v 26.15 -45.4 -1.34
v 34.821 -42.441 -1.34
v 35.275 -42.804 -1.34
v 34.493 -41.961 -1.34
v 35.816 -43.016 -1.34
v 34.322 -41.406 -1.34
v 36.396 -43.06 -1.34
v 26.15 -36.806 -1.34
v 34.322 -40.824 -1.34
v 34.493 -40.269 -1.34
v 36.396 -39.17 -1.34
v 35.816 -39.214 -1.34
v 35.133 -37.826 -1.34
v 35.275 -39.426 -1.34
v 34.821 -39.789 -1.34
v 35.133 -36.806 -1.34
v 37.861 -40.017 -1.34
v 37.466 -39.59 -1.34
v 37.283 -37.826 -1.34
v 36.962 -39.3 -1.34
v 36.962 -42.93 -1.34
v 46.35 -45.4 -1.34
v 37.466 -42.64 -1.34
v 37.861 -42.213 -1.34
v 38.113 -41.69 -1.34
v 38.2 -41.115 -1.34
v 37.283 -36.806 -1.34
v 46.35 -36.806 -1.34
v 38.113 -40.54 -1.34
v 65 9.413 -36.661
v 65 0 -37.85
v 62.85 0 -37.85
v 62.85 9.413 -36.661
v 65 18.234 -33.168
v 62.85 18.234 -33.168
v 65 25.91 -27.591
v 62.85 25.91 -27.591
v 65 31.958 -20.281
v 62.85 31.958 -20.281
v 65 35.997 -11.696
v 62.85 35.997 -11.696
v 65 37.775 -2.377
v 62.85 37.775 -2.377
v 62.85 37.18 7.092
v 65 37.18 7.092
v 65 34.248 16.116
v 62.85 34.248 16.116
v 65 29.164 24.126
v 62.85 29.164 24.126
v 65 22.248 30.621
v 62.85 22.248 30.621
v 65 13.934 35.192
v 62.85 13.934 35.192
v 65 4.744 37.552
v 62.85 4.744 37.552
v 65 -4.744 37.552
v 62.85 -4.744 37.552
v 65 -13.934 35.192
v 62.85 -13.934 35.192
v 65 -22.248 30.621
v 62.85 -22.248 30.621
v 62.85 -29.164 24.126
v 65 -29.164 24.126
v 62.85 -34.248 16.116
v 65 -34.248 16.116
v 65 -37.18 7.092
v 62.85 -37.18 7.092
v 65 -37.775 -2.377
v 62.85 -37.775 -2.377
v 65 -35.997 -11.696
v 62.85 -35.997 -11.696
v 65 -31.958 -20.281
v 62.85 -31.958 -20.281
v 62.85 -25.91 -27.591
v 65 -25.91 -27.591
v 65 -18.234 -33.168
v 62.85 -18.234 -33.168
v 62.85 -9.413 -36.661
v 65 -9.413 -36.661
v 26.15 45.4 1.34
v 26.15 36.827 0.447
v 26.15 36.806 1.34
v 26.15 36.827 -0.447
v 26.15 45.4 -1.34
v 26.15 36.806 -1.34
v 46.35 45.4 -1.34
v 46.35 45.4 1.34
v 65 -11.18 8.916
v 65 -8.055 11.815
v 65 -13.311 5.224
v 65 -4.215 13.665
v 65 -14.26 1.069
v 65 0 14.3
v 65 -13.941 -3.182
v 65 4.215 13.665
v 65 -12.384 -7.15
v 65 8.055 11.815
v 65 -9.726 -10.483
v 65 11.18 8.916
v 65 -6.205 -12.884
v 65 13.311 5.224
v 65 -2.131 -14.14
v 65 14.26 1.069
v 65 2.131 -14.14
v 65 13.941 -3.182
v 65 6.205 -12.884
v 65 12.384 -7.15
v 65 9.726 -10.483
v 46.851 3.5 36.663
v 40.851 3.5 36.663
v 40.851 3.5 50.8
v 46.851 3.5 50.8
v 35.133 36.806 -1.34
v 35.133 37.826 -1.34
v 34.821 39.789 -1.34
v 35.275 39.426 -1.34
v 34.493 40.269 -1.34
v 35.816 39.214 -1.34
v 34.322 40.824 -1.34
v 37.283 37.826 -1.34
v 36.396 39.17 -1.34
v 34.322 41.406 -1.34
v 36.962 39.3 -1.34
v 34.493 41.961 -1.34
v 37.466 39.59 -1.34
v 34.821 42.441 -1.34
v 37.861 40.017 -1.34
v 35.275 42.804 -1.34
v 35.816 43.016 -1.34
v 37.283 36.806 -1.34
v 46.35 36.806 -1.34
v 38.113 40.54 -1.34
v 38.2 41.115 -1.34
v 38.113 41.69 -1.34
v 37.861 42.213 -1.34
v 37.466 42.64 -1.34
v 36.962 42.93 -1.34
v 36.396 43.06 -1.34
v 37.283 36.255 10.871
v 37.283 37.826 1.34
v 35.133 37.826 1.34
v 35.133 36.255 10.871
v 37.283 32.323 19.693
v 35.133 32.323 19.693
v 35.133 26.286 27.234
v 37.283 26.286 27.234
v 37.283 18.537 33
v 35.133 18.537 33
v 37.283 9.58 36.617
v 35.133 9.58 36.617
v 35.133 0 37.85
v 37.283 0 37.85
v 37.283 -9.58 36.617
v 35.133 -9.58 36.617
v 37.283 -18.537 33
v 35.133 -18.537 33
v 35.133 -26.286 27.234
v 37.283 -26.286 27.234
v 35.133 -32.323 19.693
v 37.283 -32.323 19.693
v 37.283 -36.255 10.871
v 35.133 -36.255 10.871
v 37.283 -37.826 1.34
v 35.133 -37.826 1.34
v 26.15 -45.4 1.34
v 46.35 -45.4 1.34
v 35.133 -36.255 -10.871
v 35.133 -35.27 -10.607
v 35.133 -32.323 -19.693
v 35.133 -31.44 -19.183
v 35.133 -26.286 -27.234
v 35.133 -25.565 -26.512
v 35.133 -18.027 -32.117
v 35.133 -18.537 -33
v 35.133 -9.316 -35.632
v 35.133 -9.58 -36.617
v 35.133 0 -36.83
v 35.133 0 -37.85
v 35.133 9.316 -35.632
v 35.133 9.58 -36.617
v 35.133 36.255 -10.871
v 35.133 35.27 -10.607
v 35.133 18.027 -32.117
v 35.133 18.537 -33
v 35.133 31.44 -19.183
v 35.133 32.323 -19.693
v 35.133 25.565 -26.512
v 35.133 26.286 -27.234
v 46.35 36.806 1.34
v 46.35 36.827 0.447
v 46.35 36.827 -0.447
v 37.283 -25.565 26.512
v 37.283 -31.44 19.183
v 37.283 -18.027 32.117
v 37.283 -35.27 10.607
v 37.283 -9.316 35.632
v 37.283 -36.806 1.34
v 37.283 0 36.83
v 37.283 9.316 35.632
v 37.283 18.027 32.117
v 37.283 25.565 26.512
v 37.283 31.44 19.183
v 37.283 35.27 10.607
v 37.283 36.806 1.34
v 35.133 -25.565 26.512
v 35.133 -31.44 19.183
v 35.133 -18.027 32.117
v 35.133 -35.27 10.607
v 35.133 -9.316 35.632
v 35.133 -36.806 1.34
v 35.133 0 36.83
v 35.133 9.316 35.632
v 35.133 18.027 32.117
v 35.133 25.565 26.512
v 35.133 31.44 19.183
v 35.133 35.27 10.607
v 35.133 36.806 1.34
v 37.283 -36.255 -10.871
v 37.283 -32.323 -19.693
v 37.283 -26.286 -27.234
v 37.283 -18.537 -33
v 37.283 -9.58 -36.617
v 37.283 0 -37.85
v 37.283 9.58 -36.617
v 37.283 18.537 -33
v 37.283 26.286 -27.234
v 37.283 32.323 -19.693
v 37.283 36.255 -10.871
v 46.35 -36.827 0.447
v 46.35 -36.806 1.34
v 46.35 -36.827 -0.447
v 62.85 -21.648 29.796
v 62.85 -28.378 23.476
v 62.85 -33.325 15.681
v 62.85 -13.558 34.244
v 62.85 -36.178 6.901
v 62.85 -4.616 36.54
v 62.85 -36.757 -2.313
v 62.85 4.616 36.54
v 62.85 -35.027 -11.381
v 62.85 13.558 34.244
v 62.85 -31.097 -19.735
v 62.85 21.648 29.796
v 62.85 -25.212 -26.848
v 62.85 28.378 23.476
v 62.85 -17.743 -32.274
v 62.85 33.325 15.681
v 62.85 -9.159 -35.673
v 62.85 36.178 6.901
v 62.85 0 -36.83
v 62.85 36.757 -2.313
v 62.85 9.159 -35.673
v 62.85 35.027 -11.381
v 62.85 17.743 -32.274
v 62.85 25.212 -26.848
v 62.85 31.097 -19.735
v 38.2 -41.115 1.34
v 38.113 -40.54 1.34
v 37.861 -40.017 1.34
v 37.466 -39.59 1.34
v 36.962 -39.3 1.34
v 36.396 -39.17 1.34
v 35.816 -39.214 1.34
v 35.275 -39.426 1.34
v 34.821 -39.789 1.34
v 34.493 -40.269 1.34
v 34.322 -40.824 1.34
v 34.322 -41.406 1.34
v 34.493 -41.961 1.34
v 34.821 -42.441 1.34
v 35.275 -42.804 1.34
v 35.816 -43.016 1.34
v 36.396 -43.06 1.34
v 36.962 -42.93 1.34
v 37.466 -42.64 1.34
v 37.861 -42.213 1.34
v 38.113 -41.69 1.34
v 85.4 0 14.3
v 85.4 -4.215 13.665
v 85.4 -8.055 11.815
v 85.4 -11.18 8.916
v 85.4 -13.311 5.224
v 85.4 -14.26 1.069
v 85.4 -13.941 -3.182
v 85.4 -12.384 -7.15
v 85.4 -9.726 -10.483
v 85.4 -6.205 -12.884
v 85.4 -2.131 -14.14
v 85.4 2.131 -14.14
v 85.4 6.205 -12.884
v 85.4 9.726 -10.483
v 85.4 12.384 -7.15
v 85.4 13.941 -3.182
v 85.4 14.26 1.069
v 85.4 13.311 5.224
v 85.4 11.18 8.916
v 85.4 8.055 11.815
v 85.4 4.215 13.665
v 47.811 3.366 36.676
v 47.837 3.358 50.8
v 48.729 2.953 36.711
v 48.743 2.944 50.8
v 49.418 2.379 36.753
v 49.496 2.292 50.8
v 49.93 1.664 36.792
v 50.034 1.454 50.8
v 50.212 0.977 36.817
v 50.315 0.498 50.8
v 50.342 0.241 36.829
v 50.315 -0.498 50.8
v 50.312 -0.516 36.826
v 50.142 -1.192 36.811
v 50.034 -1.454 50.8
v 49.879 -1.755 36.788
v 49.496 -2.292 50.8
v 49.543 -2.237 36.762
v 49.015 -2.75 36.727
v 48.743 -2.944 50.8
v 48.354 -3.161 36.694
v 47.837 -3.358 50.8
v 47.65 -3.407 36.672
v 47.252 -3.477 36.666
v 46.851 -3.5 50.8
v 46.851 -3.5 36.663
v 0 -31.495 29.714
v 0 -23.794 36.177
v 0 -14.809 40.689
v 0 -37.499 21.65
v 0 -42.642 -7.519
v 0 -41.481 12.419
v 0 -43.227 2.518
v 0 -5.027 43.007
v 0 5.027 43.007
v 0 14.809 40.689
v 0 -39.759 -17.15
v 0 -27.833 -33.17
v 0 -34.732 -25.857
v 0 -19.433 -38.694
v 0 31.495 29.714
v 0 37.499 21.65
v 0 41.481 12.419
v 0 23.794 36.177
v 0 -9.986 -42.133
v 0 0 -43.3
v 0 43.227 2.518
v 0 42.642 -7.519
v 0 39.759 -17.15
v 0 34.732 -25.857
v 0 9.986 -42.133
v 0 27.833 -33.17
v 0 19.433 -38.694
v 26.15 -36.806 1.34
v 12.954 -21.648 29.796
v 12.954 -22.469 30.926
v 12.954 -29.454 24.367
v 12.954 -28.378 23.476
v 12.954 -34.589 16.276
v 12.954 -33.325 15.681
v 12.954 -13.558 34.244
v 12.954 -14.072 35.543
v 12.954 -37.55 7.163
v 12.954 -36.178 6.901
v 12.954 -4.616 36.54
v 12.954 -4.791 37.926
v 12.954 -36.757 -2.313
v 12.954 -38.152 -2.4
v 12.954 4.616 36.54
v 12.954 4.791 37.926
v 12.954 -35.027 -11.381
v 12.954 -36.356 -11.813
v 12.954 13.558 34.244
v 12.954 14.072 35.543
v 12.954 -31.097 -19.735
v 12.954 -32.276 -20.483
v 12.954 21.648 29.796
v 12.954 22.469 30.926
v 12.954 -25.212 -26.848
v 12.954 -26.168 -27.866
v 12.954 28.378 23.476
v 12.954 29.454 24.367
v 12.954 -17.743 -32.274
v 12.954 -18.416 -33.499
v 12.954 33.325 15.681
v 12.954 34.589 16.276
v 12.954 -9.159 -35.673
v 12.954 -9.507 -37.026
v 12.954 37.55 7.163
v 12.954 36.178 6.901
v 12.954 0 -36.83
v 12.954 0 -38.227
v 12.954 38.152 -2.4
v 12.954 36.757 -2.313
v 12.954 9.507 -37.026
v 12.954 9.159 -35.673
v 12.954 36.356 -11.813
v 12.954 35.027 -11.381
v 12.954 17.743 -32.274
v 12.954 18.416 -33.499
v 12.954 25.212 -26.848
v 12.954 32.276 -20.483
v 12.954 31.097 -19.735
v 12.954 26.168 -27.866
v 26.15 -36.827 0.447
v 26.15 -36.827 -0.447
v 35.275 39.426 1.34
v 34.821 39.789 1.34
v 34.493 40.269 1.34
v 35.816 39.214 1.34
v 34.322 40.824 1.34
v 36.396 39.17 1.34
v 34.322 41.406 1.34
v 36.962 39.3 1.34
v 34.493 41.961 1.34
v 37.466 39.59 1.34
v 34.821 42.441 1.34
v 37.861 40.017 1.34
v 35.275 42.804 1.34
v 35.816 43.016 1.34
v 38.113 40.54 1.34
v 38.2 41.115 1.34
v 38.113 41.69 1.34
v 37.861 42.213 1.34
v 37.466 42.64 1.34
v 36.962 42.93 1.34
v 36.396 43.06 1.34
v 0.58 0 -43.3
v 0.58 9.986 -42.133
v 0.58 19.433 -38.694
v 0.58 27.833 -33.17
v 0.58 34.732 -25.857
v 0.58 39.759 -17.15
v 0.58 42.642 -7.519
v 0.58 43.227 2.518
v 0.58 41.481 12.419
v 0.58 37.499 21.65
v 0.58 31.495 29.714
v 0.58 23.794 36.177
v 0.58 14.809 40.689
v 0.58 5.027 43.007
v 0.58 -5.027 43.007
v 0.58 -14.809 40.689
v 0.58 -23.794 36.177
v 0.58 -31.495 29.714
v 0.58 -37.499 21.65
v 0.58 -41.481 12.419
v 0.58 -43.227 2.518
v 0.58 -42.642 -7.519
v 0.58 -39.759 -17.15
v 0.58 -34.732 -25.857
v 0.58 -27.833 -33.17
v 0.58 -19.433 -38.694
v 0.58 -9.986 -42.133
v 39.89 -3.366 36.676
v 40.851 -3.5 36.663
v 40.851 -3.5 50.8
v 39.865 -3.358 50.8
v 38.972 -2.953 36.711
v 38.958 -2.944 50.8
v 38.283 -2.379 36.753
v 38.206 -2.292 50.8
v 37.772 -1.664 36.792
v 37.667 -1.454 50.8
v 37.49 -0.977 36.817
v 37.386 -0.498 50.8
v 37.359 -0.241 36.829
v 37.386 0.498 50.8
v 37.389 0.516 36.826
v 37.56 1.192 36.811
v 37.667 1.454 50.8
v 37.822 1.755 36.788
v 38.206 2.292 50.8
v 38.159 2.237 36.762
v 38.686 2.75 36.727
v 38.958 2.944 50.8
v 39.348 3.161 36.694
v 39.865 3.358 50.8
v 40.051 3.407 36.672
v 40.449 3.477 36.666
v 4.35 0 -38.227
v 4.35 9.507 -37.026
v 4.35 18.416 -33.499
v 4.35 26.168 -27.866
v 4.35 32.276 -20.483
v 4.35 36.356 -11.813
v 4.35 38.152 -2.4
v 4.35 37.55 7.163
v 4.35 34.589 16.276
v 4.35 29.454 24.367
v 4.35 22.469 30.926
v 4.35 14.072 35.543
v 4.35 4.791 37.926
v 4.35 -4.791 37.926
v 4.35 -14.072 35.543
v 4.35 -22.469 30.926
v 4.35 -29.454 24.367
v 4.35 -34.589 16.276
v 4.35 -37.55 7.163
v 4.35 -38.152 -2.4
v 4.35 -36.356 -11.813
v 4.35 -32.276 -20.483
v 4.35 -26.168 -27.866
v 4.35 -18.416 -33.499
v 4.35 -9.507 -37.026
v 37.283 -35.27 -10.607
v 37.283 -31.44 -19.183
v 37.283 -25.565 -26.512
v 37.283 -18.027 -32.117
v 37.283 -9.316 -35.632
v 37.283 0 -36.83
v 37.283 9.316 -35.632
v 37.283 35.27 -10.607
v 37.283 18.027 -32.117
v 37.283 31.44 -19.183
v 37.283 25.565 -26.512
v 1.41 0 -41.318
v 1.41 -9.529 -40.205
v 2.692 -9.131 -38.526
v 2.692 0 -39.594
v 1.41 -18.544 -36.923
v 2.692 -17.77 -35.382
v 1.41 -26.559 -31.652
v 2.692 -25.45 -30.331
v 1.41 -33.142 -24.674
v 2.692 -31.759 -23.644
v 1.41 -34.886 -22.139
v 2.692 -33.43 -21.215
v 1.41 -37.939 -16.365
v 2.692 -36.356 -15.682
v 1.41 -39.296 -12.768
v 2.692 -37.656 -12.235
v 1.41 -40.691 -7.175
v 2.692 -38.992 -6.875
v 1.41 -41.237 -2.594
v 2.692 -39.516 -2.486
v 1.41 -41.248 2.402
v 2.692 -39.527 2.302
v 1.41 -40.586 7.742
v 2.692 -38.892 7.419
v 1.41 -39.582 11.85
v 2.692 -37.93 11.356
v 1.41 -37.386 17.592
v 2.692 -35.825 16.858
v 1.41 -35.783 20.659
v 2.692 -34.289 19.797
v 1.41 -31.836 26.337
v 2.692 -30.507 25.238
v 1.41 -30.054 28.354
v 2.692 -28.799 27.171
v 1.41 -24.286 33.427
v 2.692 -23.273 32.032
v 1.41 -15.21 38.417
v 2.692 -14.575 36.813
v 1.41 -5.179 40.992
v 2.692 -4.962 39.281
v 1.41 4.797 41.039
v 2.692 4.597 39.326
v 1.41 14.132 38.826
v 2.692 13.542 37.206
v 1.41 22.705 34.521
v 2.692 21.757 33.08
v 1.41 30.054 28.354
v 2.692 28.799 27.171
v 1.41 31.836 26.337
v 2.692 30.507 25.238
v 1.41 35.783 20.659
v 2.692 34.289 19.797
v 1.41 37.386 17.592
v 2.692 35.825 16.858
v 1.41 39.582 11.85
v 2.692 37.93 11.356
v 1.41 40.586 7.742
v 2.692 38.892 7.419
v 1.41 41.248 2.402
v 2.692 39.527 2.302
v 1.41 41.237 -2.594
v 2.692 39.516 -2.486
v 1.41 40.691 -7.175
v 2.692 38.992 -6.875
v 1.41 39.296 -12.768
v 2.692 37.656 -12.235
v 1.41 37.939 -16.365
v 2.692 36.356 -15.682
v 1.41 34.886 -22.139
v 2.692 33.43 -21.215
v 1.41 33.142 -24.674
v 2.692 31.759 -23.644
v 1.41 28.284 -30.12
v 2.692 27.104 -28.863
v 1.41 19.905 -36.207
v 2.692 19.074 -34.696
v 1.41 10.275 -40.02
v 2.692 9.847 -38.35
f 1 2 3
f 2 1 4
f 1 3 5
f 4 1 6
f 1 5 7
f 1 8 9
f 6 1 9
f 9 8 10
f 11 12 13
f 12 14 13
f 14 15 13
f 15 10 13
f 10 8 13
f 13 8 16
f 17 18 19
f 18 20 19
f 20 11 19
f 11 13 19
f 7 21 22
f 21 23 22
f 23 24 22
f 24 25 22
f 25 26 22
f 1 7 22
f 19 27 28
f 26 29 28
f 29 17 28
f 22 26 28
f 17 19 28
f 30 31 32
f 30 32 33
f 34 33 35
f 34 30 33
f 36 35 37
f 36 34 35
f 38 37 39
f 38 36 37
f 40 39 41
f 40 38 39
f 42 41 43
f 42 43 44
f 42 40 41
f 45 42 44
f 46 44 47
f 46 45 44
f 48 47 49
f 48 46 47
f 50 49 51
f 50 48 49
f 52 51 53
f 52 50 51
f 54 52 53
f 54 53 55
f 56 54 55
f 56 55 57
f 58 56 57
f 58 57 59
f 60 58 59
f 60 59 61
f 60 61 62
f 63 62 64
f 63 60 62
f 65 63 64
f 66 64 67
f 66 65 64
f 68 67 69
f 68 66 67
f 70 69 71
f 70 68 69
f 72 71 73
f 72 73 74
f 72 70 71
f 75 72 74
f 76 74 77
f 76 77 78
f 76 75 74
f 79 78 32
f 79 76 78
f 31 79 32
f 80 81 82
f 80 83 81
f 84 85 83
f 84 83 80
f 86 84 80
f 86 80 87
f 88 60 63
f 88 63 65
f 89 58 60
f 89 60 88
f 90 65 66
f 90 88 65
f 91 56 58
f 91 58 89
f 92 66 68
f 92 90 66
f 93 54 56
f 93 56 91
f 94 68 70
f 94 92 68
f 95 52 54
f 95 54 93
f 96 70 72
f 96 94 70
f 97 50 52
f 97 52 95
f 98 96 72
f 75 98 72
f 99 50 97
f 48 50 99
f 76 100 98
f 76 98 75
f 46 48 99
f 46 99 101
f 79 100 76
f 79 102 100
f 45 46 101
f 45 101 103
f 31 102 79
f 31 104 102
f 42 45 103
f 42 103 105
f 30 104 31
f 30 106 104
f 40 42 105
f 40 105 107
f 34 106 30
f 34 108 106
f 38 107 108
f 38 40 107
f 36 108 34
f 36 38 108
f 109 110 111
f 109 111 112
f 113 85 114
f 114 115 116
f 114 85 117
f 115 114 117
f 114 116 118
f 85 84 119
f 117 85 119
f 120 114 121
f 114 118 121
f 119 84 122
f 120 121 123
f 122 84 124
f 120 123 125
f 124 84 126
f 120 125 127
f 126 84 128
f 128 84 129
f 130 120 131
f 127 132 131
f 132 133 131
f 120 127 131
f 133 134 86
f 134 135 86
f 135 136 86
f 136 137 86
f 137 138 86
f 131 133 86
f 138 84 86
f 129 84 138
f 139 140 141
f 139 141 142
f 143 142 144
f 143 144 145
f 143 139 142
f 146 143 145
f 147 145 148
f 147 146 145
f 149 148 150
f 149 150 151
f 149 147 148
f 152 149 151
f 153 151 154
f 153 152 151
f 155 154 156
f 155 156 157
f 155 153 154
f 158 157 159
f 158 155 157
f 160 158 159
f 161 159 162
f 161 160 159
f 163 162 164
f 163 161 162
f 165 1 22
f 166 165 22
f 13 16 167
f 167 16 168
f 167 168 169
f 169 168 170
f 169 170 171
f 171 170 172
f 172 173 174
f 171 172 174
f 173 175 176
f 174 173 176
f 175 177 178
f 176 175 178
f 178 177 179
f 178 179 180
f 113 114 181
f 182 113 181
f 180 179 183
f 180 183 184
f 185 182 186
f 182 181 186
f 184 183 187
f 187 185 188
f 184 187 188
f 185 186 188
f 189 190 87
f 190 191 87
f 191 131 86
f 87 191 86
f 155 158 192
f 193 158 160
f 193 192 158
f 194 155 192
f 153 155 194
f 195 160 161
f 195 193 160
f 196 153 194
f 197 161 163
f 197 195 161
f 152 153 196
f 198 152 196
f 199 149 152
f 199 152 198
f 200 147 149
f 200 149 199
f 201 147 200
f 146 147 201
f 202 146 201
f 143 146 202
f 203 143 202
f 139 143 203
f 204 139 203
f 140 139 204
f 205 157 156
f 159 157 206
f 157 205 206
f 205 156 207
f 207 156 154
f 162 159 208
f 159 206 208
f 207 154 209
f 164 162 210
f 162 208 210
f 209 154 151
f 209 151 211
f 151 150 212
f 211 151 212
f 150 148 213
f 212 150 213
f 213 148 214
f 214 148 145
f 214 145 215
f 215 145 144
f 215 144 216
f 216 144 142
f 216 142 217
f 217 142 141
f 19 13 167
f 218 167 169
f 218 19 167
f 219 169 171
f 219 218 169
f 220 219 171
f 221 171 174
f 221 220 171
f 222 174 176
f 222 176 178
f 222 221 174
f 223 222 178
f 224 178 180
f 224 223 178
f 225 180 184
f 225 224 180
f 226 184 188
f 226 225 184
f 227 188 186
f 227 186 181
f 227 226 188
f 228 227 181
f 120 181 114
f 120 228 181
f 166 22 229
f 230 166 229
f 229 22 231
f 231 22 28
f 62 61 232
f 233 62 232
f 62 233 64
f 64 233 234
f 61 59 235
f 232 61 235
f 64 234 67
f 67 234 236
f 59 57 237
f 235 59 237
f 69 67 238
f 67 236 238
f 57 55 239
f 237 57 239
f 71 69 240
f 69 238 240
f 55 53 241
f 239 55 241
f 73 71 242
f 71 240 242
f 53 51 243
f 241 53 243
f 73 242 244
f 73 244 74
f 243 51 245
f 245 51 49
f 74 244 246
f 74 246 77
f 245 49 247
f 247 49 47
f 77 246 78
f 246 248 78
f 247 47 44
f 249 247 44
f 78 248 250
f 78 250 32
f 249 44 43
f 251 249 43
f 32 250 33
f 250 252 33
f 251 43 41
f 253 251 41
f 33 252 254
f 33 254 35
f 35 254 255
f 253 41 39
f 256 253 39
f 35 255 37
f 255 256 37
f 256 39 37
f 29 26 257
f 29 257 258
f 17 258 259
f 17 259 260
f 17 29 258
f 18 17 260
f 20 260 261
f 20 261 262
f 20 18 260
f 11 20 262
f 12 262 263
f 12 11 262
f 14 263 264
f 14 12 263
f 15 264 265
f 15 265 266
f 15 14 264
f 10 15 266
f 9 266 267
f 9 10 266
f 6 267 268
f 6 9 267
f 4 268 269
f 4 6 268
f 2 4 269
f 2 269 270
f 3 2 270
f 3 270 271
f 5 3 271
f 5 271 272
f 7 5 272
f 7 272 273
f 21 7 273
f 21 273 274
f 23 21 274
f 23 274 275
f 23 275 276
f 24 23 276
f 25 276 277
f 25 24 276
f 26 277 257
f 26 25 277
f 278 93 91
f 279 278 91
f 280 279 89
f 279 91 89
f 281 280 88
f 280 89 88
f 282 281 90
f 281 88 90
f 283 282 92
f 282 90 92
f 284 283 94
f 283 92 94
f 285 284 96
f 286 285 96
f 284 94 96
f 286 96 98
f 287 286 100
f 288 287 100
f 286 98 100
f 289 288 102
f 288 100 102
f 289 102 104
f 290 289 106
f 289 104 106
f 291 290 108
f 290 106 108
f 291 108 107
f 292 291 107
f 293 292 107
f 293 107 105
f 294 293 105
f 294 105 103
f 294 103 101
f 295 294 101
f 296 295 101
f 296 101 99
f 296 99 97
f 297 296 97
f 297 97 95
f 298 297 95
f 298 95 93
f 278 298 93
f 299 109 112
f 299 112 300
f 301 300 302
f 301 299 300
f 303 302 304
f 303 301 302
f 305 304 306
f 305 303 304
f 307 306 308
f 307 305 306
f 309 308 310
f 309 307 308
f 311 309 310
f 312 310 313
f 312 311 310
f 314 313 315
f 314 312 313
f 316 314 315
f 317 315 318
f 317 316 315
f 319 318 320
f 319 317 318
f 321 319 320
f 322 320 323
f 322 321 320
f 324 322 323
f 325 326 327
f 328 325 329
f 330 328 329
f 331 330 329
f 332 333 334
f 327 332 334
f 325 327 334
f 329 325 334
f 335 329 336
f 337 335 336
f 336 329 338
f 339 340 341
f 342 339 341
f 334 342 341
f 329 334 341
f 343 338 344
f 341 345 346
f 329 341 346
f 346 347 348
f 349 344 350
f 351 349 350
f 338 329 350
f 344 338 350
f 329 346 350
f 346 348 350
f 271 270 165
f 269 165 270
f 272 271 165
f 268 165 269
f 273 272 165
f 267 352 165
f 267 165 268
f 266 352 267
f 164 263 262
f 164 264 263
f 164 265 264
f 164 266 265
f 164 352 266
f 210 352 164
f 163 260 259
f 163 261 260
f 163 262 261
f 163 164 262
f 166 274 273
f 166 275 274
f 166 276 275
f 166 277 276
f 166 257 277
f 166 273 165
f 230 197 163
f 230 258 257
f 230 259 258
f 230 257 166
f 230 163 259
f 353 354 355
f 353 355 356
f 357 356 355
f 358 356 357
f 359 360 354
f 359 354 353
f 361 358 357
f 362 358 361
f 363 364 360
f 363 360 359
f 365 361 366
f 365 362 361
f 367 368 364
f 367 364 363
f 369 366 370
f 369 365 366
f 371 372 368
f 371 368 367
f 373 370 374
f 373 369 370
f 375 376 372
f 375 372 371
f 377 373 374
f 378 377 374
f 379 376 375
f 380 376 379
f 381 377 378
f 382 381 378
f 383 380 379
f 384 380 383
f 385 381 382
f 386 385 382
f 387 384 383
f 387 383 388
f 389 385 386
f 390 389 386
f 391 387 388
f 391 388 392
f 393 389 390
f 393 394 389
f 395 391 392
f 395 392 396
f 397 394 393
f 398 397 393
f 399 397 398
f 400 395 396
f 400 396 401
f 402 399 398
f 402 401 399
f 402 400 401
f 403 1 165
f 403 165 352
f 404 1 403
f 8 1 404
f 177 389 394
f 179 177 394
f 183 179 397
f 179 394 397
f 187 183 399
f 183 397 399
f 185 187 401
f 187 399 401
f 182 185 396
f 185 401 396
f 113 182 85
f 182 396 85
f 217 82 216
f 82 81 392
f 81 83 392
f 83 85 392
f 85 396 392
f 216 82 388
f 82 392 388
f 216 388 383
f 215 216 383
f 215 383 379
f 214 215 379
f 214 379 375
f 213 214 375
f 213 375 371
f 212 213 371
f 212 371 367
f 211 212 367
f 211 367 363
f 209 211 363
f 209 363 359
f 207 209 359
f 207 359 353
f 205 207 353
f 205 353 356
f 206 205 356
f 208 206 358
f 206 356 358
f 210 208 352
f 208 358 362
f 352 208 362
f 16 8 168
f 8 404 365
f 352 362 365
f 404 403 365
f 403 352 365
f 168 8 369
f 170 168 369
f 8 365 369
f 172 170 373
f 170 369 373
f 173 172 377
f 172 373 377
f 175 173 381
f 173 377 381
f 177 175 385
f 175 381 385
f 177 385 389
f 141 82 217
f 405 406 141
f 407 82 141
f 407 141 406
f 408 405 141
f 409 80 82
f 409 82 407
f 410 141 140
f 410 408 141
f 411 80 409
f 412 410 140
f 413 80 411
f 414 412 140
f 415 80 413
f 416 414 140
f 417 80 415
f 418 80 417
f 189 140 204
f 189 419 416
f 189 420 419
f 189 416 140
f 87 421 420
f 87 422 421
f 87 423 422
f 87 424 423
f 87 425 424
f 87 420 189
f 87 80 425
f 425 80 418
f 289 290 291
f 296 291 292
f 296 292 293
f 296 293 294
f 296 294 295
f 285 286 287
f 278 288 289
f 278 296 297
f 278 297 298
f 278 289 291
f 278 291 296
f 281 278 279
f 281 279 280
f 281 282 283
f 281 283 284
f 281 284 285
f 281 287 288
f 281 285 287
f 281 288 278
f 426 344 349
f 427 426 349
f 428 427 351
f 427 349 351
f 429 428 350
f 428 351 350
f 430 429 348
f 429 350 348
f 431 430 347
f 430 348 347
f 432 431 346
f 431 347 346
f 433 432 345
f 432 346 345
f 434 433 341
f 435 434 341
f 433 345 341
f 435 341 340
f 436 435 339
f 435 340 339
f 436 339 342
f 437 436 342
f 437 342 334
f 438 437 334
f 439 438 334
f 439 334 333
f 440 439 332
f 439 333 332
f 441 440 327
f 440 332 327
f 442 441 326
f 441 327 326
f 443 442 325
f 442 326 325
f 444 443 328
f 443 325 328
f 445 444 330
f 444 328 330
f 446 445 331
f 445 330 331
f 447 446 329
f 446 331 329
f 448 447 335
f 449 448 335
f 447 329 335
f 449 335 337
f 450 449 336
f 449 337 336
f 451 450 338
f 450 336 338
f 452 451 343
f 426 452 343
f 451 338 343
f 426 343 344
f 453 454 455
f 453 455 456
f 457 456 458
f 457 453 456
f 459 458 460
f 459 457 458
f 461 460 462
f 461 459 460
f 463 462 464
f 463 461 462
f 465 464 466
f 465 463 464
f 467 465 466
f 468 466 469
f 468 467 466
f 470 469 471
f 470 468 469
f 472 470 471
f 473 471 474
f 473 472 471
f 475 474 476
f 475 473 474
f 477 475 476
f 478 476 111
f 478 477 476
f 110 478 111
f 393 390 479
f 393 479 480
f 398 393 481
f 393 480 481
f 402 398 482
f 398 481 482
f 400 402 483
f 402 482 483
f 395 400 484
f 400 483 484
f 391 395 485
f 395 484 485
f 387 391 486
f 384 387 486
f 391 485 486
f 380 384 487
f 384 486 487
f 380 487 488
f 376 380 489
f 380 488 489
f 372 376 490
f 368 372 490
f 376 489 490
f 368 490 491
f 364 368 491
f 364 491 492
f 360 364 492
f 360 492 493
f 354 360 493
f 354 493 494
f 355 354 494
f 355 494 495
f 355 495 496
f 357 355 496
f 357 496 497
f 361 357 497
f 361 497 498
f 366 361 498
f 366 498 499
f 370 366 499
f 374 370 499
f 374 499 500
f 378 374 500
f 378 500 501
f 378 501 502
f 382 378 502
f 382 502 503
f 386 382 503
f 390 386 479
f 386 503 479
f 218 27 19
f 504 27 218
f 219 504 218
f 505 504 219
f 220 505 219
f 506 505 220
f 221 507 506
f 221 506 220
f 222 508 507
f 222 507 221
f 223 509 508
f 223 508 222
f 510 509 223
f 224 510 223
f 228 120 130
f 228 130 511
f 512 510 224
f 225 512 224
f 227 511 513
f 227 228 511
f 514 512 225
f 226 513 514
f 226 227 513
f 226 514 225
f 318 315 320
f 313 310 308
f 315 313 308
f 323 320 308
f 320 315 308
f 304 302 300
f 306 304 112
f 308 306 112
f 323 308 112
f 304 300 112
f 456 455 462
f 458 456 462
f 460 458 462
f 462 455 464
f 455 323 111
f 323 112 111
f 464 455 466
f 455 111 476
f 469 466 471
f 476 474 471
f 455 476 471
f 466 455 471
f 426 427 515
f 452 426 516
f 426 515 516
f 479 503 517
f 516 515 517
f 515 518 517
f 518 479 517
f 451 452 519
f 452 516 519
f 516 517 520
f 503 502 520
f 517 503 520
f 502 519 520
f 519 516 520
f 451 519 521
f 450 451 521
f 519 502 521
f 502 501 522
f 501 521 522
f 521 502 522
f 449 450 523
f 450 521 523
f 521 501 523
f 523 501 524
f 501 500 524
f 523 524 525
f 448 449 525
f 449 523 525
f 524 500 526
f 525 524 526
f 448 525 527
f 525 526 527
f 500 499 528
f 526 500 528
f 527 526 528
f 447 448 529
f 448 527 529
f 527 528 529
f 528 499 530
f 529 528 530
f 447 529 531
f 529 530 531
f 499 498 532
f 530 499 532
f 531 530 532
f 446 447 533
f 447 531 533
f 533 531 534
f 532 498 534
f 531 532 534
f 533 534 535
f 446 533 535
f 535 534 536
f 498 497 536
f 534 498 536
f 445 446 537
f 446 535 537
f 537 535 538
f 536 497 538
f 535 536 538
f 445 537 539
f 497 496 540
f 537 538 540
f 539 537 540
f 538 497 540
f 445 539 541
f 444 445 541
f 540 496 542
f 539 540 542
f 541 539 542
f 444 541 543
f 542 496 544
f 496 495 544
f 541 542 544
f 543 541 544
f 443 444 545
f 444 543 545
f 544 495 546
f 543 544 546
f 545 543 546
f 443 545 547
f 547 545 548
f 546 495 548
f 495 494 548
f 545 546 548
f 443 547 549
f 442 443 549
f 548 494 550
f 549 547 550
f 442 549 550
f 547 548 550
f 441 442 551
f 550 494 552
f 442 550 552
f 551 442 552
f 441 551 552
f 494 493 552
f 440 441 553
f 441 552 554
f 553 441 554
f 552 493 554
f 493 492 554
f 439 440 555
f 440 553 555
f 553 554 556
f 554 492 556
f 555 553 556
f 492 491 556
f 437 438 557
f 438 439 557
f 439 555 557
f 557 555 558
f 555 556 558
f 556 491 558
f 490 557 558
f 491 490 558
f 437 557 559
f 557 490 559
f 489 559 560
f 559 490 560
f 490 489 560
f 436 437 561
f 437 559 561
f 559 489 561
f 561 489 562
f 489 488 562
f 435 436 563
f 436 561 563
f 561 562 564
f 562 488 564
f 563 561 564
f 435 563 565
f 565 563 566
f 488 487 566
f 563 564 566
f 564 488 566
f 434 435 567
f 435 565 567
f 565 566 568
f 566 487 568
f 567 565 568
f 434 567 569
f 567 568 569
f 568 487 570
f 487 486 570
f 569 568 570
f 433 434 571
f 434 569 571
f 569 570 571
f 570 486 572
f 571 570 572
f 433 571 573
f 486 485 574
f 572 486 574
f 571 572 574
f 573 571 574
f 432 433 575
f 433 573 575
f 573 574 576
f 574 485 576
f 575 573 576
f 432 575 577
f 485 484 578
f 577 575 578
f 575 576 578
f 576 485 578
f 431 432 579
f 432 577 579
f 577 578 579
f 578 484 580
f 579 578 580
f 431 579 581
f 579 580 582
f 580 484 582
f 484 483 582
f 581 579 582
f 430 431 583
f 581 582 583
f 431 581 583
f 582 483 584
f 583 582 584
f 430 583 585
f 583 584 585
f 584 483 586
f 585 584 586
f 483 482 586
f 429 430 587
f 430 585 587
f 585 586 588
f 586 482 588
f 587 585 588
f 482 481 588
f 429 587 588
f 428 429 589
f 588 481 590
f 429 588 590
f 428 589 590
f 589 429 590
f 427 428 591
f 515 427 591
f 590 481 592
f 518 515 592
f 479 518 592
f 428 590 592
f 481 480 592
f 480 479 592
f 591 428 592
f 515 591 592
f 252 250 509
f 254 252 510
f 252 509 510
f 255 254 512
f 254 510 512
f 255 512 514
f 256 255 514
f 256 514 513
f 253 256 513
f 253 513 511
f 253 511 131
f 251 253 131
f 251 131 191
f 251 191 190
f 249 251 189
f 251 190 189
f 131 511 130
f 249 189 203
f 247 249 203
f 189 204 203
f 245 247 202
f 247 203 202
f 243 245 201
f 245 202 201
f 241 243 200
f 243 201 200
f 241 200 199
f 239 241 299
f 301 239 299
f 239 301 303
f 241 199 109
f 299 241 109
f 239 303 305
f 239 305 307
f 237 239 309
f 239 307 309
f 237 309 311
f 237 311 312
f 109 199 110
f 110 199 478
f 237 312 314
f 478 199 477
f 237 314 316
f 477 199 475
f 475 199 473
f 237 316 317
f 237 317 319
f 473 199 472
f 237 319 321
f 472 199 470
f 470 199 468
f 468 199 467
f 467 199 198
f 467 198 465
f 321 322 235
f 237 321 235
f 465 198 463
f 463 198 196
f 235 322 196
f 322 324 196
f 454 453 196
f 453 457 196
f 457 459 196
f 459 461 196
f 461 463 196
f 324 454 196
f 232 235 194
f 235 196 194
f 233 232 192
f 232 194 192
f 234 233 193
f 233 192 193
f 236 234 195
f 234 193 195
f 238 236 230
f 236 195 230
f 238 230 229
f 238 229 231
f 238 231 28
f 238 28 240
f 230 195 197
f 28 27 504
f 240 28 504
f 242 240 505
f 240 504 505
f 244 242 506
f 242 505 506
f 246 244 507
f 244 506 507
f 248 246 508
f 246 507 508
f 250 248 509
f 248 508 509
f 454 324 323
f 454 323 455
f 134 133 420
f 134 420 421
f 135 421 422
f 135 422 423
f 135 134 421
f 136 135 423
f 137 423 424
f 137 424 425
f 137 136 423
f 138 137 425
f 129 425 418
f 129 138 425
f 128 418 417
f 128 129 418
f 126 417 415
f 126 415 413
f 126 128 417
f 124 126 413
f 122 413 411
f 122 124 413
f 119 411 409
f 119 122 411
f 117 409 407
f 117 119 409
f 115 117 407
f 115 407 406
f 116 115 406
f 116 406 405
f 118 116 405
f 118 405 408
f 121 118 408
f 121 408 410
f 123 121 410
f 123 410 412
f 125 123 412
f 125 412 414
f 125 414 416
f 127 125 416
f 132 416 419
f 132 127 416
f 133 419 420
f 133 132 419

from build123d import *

# Parameters (mm, degrees)
SKETCH1_R                = 43.3
BOSS_EXTRUDE1_DEPTH      = 0.58
BOSS_EXTRUDE2_START      = -0.58
SKETCH2_R                = 36.83
BOSS_EXTRUDE2_DEPTH      = 65
BOSS_EXTRUDE3_DEPTH      = 1.34
BOSS_EXTRUDE3_DEPTH_BACK = 1.34
SKETCH3_W                = 20.2
SKETCH3_H                = 90.8
SKETCH3_R                = 1.95
BOSS_EXTRUDE4_START      = 64.42
SKETCH4_R                = 37.849999992
BOSS_EXTRUDE4_DEPTH      = 2.15
BOSS_EXTRUDE5_START      = 36.703
SKETCH4_2_R              = 37.849999992
BOSS_EXTRUDE5_DEPTH      = 2.15
BOSS_EXTRUDE6_START      = -65
SKETCH5_R                = 14.299999975
BOSS_EXTRUDE6_DEPTH      = 85.4
BOSS_EXTRUDE7_DEPTH      = 50.8
FILLET1_R                = 8.89
BOSS_EXTRUDE8_START      = -65
SKETCH6_R                = 38.227
BOSS_EXTRUDE8_DEPTH      = 12.954


with BuildPart() as part:
    # Sketch1 → Boss-Extrude1 (new body)
    with BuildSketch(Plane(origin=(0, 0, 0), x_dir=(0, 0, -1), z_dir=(1, 0, 0))):
        Circle(SKETCH1_R)
    extrude(amount=BOSS_EXTRUDE1_DEPTH)

    # Sketch2 → Boss-Extrude2 (add)
    with BuildSketch(Plane(origin=(0.58, 0, 0), x_dir=(0, 0, -1), z_dir=(1, 0, 0)).offset(BOSS_EXTRUDE2_START)):
        Circle(SKETCH2_R)
    extrude(amount=BOSS_EXTRUDE2_DEPTH)

    # Sketch3 → Boss-Extrude3 (add, two sides: drawn at the far end of the back side and taken through both)
    with BuildSketch(Plane.XY.offset(-BOSS_EXTRUDE3_DEPTH_BACK)):
        with Locations((36.25, 0)):
            Rectangle(SKETCH3_W, SKETCH3_H)
        with Locations((36.25, 41.115)):
            Circle(SKETCH3_R, mode=Mode.SUBTRACT)
        with Locations((36.25, -41.115)):
            Circle(SKETCH3_R, mode=Mode.SUBTRACT)
    extrude(amount=BOSS_EXTRUDE3_DEPTH + BOSS_EXTRUDE3_DEPTH_BACK)

    # Sketch4 → Boss-Extrude4 (add)
    with BuildSketch(Plane(origin=(0.58, 0, 0), x_dir=(0, 0, -1), z_dir=(1, 0, 0)).offset(BOSS_EXTRUDE4_START)):
        Circle(SKETCH4_R)
    extrude(amount=-BOSS_EXTRUDE4_DEPTH)

    # Sketch4<2> → Boss-Extrude5 (add)
    with BuildSketch(Plane(origin=(0.58, 0, 0), x_dir=(0, 0, -1), z_dir=(1, 0, 0)).offset(BOSS_EXTRUDE5_START)):
        Circle(SKETCH4_2_R)
    extrude(amount=-BOSS_EXTRUDE5_DEPTH)

    # Sketch5 → Boss-Extrude6 (add)
    with BuildSketch(Plane(origin=(65, 0, 0), x_dir=(0, 0, -1), z_dir=(1, 0, 0)).offset(BOSS_EXTRUDE6_START)):
        with Locations(Location((0, 0, 0), (0, 0, 180))):
            Circle(SKETCH5_R)
    extrude(amount=BOSS_EXTRUDE6_DEPTH)

    # Sketch3<3> → Boss-Extrude7 (add)
    with BuildSketch(Plane.XY):
        with BuildLine():
            Line((40.850706358, 3.5), (46.850706358, 3.5))
            ThreePointArc((46.850706358, 3.5), (50.350706358, 0), (46.850706358, -3.5))
            Line((46.850706358, -3.5), (40.850706358, -3.5))
            ThreePointArc((40.850706358, -3.5), (37.350706358, 0), (40.850706358, 3.5))
        make_face()
    extrude(amount=BOSS_EXTRUDE7_DEPTH)

    # Fillet1
    # the kernel refuses this fillet: 8.89 mm, written as the material it adds along each edge
    with BuildSketch(Plane(origin=(0.58, 0, 0), x_dir=(0, 0, -1), z_dir=(0, 1, 0))) as fillet1_piece_1:
        with BuildLine():
            CenterArc((45.72, -8.554279631), FILLET1_R, 105.796172805, 74.203827195)
            Line((36.83, -8.554279631), (36.6522, -8.554279631))
            Line((36.6522, -8.554279631), (36.6522, 0))
            Line((36.6522, 0), (36.83, 0.1778))
            ThreePointArc((36.83, 0.1778), (40.065, 0.1778), (43.2516, 0.171085593))
            Line((43.2516, 0.171085593), (43.3, 0))
        make_face()
    revolve(axis=Axis((0.58, 0, 0), (-1, 0, 0)))

    # Sketch6 → Boss-Extrude8 (add)
    with BuildSketch(Plane(origin=(65, 0, 0), x_dir=(0, 0, -1), z_dir=(1, 0, 0)).offset(BOSS_EXTRUDE8_START)):
        Circle(SKETCH6_R)
    extrude(amount=BOSS_EXTRUDE8_DEPTH)


solid = part.part
